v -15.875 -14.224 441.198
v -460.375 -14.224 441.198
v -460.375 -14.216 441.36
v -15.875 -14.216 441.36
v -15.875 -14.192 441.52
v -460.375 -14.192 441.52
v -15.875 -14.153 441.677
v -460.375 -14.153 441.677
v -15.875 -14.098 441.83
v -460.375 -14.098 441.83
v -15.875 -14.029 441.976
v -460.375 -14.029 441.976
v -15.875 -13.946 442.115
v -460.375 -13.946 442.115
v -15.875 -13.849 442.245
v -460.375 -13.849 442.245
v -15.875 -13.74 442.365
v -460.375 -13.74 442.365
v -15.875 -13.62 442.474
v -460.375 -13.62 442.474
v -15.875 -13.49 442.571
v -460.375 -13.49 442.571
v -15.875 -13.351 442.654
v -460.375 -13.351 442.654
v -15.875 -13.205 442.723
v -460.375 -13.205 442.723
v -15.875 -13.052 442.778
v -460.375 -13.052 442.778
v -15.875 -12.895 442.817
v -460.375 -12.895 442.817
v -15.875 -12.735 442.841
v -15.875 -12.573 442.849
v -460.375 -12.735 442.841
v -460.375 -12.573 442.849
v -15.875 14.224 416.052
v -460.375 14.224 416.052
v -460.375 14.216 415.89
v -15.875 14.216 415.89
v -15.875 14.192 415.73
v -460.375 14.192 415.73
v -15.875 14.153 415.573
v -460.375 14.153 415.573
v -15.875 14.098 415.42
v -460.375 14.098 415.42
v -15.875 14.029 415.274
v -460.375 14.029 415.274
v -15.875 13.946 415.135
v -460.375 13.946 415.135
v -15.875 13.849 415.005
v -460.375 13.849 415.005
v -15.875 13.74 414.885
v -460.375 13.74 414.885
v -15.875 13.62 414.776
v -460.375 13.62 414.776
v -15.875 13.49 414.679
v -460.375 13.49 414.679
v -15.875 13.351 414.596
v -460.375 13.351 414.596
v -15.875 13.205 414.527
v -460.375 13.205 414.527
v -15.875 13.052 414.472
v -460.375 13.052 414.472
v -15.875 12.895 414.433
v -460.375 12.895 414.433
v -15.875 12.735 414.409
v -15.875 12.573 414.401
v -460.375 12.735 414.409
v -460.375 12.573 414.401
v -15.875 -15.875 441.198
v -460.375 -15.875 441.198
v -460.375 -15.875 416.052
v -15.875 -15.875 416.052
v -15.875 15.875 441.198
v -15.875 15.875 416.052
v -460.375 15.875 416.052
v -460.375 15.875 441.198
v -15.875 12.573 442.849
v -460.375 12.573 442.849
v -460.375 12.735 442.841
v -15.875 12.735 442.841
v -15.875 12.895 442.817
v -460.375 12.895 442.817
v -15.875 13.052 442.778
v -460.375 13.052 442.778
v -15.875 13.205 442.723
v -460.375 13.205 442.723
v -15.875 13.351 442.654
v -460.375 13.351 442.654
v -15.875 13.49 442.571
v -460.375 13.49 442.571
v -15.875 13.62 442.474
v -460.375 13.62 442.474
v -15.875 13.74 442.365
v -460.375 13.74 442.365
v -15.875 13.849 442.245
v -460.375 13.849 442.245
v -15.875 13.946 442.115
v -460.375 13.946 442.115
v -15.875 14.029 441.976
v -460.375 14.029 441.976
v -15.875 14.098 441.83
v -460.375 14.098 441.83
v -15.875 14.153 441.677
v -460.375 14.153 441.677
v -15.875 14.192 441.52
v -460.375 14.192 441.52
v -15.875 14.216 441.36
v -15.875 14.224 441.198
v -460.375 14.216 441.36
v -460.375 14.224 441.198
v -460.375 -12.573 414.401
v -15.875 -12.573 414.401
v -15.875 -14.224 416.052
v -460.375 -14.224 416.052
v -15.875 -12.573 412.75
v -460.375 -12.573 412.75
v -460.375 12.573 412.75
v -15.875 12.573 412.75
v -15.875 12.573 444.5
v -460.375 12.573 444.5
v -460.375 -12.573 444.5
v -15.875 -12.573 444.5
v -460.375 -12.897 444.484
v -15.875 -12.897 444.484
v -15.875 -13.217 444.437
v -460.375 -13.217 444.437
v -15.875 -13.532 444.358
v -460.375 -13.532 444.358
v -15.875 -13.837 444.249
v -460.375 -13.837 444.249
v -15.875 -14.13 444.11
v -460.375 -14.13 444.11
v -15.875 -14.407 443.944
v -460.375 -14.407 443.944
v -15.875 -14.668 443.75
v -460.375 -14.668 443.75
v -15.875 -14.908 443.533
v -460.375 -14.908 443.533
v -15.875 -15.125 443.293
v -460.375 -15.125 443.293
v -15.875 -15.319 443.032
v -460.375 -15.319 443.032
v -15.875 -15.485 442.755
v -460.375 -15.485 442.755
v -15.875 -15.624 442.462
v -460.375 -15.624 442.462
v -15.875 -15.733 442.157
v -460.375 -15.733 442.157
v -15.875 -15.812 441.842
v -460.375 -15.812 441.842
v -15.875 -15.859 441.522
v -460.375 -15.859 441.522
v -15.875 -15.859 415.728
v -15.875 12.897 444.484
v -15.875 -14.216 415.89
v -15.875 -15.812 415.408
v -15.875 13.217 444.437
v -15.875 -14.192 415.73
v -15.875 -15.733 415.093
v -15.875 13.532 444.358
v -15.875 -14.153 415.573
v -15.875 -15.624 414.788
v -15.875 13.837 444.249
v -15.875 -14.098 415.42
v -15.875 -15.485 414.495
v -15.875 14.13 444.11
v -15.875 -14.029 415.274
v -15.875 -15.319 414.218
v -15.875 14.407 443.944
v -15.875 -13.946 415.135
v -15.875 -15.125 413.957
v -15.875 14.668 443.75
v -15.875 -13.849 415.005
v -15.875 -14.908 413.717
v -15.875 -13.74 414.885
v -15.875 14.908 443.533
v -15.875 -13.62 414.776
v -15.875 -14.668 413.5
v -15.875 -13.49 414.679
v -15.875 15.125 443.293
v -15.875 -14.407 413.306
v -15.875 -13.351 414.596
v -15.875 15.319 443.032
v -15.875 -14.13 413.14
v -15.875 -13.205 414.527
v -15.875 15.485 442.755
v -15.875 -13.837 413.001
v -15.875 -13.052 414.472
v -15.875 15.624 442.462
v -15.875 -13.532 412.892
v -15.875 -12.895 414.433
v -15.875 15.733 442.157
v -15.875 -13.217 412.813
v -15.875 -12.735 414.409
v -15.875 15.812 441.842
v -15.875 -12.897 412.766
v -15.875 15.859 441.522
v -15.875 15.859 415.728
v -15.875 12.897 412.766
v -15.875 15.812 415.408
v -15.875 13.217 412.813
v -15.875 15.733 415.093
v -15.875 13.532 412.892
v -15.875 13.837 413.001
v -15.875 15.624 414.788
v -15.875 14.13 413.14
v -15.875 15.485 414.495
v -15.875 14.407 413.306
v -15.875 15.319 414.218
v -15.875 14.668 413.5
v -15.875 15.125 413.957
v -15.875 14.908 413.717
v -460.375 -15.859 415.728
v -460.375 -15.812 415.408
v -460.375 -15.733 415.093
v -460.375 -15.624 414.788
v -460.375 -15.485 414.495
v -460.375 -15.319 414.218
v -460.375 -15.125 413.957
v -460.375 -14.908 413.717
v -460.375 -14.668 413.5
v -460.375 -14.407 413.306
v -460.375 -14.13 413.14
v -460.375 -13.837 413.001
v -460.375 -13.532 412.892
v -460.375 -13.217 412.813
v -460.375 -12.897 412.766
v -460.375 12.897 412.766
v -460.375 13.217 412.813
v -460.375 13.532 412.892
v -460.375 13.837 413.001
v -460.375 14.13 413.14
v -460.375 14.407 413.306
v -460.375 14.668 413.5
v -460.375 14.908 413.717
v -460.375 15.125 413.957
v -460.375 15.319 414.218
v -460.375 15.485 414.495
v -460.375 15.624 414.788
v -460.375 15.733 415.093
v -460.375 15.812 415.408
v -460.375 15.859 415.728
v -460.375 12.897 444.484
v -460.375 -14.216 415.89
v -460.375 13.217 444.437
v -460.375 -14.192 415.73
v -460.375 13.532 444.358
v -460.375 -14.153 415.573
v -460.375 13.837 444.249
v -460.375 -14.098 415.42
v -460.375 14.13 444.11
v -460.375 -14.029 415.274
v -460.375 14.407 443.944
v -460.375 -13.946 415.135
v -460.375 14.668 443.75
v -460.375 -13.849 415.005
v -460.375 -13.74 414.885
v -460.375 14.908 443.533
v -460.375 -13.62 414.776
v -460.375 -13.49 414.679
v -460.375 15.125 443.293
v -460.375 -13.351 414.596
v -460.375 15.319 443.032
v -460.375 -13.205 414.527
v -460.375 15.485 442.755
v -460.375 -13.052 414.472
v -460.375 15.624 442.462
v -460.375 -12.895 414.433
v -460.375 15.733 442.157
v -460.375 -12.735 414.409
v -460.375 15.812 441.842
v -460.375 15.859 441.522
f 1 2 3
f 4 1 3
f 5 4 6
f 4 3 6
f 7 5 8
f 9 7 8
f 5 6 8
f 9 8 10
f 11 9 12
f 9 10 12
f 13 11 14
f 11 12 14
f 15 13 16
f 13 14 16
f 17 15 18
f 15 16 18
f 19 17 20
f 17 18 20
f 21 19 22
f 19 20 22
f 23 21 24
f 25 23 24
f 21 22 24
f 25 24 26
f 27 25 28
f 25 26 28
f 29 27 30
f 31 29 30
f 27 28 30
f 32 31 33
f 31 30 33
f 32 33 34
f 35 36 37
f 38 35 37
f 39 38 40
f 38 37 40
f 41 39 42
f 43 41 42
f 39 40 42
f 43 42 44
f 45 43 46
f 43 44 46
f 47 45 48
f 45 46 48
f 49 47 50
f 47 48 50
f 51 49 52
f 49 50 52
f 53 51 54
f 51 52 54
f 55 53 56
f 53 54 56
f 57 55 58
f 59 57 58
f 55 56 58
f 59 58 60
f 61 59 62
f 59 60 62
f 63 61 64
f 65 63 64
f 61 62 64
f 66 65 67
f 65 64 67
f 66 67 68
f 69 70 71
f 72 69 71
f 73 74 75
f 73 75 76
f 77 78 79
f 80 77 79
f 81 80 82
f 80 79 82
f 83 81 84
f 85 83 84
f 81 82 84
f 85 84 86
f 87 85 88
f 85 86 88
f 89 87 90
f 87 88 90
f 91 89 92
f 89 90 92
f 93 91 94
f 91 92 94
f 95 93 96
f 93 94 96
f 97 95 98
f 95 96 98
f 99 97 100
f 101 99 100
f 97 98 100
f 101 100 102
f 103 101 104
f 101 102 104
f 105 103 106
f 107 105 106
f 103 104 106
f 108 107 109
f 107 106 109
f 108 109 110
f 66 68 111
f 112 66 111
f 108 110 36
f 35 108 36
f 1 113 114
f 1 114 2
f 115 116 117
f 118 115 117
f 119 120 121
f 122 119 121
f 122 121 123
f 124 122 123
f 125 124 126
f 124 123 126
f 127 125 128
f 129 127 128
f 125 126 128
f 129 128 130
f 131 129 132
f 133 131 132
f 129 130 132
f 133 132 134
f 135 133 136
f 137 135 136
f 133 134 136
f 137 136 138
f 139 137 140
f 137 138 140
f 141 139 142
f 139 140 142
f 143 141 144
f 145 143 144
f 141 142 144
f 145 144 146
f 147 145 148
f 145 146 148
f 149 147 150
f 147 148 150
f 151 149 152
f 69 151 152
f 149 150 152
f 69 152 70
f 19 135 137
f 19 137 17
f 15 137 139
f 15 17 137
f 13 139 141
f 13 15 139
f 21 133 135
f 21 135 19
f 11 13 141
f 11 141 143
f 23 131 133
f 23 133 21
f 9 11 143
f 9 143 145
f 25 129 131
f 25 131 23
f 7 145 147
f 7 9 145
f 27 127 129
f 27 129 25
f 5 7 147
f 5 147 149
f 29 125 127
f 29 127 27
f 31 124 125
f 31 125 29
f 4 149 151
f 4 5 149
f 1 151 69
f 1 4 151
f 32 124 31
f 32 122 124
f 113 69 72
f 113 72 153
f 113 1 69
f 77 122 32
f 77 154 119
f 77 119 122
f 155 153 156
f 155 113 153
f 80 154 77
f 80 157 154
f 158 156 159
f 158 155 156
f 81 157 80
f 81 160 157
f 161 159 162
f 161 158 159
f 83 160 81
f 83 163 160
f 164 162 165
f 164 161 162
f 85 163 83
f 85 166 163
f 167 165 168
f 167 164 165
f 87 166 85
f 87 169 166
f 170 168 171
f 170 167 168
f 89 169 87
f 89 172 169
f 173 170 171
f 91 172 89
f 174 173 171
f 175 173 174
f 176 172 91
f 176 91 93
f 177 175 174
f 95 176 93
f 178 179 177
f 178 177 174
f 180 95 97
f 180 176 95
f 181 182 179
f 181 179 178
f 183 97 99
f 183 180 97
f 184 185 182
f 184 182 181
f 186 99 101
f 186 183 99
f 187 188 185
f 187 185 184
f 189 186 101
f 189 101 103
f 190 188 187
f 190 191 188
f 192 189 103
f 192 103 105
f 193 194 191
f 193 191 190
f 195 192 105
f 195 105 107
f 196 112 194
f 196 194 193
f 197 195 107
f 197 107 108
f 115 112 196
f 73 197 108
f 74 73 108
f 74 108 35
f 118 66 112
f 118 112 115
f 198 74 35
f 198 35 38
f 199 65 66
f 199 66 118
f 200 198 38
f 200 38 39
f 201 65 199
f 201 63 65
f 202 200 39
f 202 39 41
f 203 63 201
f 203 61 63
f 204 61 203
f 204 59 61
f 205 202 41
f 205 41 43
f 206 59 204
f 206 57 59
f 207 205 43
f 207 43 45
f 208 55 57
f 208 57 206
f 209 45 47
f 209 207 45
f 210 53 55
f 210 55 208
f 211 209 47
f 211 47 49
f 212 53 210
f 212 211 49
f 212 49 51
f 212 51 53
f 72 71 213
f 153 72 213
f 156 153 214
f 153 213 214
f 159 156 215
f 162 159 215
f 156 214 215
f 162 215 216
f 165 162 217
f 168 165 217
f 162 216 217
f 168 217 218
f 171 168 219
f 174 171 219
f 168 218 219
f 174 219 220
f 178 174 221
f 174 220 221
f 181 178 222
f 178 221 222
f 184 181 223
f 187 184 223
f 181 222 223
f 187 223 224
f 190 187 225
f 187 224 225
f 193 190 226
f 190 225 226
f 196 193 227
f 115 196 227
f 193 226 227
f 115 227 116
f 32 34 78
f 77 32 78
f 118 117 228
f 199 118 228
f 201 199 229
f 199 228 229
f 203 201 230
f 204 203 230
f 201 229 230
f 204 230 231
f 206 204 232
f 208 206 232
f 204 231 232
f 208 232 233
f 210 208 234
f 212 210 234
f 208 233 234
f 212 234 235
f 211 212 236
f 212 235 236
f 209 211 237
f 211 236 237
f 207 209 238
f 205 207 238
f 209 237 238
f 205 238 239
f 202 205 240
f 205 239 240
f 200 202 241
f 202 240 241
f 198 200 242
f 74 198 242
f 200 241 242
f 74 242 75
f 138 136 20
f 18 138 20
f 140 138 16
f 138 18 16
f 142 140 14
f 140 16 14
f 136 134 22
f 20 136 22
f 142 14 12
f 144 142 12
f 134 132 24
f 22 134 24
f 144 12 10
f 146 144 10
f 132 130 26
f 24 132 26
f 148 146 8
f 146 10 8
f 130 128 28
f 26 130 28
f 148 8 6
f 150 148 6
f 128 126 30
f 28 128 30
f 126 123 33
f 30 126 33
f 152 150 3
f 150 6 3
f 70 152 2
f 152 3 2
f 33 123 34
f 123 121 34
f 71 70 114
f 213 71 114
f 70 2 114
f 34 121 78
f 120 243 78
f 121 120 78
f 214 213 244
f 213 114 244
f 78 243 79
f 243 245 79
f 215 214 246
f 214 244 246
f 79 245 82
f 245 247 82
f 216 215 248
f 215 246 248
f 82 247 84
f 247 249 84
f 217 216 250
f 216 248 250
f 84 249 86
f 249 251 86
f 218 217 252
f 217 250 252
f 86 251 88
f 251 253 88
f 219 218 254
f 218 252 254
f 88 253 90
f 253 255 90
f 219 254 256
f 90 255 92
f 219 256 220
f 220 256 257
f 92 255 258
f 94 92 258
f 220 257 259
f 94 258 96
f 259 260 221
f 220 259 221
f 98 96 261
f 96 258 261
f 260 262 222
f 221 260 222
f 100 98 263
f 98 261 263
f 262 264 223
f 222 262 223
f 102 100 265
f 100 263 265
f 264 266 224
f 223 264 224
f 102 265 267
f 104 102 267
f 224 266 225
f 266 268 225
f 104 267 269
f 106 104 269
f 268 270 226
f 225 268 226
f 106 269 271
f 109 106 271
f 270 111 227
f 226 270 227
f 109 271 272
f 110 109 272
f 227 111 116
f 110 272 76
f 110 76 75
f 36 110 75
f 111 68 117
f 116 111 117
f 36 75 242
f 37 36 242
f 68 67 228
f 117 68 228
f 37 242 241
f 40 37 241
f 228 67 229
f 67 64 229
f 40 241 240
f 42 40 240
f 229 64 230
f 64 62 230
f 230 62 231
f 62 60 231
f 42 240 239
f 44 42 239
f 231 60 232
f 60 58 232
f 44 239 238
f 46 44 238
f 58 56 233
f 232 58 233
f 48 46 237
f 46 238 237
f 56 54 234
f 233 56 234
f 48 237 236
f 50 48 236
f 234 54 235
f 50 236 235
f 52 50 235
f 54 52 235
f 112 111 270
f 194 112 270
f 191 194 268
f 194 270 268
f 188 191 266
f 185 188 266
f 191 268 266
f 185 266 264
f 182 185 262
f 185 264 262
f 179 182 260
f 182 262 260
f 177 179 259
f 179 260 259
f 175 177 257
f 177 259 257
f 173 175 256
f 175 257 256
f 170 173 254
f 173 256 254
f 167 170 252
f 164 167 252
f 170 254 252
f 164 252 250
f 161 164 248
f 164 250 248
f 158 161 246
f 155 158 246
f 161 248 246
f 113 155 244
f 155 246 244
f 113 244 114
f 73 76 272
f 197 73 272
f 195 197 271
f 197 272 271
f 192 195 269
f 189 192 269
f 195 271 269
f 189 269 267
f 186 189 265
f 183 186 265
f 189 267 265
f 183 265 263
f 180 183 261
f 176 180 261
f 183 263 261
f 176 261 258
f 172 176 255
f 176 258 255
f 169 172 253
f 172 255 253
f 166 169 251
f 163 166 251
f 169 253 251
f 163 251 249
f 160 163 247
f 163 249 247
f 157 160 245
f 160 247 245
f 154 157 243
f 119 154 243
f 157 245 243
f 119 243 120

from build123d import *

# Parameters (mm, degrees)
F2_DEPTH = 444.5
F3_ANGLE = 90


# Not quite as in the source:
# - a variable given as a bare number and used for a length is read in inches; the dataset says mm whatever the document's units were


with BuildPart() as f2:
    # F0 (on Top) → F2 (new body)
    with BuildSketch(Plane.XY):
        with BuildLine():
            Line((-12.573, -15.875), (12.573, -15.875))
            ThreePointArc((12.573, -15.875), (14.9078665915, -14.9078665915), (15.875, -12.573))
            Line((15.875, -12.573), (15.875, 12.573))
            ThreePointArc((15.875, 12.573), (14.9078665915, 14.9078665915), (12.573, 15.875))
            Line((12.573, 15.875), (-12.573, 15.875))
            ThreePointArc((-12.573, 15.875), (-14.9078665915, 14.9078665915), (-15.875, 12.573))
            Line((-15.875, 12.573), (-15.875, -12.573))
            ThreePointArc((-15.875, -12.573), (-14.9078665915, -14.9078665915), (-12.573, -15.875))
        make_face()
        with BuildLine():
            Line((-12.573, 14.224), (12.573, 14.224))
            ThreePointArc((12.573, 14.224), (13.7404332957, 13.7404332957), (14.224, 12.573))
            Line((14.224, 12.573), (14.224, -12.573))
            ThreePointArc((14.224, -12.573), (13.7404332957, -13.7404332957), (12.573, -14.224))
            Line((12.573, -14.224), (-12.573, -14.224))
            ThreePointArc((-12.573, -14.224), (-13.7404332957, -13.7404332957), (-14.224, -12.573))
            Line((-14.224, -12.573), (-14.224, 12.573))
            ThreePointArc((-14.224, 12.573), (-13.7404332957, 13.7404332957), (-12.573, 14.224))
        make_face(mode=Mode.SUBTRACT)
    extrude(amount=F2_DEPTH)


with BuildPart() as f2_1:
    # F3: moved
    add(f2.part.rotate(Axis((-15.875, 0, 444.5), (0, 1, 0)), F3_ANGLE))


solid = f2_1.part
